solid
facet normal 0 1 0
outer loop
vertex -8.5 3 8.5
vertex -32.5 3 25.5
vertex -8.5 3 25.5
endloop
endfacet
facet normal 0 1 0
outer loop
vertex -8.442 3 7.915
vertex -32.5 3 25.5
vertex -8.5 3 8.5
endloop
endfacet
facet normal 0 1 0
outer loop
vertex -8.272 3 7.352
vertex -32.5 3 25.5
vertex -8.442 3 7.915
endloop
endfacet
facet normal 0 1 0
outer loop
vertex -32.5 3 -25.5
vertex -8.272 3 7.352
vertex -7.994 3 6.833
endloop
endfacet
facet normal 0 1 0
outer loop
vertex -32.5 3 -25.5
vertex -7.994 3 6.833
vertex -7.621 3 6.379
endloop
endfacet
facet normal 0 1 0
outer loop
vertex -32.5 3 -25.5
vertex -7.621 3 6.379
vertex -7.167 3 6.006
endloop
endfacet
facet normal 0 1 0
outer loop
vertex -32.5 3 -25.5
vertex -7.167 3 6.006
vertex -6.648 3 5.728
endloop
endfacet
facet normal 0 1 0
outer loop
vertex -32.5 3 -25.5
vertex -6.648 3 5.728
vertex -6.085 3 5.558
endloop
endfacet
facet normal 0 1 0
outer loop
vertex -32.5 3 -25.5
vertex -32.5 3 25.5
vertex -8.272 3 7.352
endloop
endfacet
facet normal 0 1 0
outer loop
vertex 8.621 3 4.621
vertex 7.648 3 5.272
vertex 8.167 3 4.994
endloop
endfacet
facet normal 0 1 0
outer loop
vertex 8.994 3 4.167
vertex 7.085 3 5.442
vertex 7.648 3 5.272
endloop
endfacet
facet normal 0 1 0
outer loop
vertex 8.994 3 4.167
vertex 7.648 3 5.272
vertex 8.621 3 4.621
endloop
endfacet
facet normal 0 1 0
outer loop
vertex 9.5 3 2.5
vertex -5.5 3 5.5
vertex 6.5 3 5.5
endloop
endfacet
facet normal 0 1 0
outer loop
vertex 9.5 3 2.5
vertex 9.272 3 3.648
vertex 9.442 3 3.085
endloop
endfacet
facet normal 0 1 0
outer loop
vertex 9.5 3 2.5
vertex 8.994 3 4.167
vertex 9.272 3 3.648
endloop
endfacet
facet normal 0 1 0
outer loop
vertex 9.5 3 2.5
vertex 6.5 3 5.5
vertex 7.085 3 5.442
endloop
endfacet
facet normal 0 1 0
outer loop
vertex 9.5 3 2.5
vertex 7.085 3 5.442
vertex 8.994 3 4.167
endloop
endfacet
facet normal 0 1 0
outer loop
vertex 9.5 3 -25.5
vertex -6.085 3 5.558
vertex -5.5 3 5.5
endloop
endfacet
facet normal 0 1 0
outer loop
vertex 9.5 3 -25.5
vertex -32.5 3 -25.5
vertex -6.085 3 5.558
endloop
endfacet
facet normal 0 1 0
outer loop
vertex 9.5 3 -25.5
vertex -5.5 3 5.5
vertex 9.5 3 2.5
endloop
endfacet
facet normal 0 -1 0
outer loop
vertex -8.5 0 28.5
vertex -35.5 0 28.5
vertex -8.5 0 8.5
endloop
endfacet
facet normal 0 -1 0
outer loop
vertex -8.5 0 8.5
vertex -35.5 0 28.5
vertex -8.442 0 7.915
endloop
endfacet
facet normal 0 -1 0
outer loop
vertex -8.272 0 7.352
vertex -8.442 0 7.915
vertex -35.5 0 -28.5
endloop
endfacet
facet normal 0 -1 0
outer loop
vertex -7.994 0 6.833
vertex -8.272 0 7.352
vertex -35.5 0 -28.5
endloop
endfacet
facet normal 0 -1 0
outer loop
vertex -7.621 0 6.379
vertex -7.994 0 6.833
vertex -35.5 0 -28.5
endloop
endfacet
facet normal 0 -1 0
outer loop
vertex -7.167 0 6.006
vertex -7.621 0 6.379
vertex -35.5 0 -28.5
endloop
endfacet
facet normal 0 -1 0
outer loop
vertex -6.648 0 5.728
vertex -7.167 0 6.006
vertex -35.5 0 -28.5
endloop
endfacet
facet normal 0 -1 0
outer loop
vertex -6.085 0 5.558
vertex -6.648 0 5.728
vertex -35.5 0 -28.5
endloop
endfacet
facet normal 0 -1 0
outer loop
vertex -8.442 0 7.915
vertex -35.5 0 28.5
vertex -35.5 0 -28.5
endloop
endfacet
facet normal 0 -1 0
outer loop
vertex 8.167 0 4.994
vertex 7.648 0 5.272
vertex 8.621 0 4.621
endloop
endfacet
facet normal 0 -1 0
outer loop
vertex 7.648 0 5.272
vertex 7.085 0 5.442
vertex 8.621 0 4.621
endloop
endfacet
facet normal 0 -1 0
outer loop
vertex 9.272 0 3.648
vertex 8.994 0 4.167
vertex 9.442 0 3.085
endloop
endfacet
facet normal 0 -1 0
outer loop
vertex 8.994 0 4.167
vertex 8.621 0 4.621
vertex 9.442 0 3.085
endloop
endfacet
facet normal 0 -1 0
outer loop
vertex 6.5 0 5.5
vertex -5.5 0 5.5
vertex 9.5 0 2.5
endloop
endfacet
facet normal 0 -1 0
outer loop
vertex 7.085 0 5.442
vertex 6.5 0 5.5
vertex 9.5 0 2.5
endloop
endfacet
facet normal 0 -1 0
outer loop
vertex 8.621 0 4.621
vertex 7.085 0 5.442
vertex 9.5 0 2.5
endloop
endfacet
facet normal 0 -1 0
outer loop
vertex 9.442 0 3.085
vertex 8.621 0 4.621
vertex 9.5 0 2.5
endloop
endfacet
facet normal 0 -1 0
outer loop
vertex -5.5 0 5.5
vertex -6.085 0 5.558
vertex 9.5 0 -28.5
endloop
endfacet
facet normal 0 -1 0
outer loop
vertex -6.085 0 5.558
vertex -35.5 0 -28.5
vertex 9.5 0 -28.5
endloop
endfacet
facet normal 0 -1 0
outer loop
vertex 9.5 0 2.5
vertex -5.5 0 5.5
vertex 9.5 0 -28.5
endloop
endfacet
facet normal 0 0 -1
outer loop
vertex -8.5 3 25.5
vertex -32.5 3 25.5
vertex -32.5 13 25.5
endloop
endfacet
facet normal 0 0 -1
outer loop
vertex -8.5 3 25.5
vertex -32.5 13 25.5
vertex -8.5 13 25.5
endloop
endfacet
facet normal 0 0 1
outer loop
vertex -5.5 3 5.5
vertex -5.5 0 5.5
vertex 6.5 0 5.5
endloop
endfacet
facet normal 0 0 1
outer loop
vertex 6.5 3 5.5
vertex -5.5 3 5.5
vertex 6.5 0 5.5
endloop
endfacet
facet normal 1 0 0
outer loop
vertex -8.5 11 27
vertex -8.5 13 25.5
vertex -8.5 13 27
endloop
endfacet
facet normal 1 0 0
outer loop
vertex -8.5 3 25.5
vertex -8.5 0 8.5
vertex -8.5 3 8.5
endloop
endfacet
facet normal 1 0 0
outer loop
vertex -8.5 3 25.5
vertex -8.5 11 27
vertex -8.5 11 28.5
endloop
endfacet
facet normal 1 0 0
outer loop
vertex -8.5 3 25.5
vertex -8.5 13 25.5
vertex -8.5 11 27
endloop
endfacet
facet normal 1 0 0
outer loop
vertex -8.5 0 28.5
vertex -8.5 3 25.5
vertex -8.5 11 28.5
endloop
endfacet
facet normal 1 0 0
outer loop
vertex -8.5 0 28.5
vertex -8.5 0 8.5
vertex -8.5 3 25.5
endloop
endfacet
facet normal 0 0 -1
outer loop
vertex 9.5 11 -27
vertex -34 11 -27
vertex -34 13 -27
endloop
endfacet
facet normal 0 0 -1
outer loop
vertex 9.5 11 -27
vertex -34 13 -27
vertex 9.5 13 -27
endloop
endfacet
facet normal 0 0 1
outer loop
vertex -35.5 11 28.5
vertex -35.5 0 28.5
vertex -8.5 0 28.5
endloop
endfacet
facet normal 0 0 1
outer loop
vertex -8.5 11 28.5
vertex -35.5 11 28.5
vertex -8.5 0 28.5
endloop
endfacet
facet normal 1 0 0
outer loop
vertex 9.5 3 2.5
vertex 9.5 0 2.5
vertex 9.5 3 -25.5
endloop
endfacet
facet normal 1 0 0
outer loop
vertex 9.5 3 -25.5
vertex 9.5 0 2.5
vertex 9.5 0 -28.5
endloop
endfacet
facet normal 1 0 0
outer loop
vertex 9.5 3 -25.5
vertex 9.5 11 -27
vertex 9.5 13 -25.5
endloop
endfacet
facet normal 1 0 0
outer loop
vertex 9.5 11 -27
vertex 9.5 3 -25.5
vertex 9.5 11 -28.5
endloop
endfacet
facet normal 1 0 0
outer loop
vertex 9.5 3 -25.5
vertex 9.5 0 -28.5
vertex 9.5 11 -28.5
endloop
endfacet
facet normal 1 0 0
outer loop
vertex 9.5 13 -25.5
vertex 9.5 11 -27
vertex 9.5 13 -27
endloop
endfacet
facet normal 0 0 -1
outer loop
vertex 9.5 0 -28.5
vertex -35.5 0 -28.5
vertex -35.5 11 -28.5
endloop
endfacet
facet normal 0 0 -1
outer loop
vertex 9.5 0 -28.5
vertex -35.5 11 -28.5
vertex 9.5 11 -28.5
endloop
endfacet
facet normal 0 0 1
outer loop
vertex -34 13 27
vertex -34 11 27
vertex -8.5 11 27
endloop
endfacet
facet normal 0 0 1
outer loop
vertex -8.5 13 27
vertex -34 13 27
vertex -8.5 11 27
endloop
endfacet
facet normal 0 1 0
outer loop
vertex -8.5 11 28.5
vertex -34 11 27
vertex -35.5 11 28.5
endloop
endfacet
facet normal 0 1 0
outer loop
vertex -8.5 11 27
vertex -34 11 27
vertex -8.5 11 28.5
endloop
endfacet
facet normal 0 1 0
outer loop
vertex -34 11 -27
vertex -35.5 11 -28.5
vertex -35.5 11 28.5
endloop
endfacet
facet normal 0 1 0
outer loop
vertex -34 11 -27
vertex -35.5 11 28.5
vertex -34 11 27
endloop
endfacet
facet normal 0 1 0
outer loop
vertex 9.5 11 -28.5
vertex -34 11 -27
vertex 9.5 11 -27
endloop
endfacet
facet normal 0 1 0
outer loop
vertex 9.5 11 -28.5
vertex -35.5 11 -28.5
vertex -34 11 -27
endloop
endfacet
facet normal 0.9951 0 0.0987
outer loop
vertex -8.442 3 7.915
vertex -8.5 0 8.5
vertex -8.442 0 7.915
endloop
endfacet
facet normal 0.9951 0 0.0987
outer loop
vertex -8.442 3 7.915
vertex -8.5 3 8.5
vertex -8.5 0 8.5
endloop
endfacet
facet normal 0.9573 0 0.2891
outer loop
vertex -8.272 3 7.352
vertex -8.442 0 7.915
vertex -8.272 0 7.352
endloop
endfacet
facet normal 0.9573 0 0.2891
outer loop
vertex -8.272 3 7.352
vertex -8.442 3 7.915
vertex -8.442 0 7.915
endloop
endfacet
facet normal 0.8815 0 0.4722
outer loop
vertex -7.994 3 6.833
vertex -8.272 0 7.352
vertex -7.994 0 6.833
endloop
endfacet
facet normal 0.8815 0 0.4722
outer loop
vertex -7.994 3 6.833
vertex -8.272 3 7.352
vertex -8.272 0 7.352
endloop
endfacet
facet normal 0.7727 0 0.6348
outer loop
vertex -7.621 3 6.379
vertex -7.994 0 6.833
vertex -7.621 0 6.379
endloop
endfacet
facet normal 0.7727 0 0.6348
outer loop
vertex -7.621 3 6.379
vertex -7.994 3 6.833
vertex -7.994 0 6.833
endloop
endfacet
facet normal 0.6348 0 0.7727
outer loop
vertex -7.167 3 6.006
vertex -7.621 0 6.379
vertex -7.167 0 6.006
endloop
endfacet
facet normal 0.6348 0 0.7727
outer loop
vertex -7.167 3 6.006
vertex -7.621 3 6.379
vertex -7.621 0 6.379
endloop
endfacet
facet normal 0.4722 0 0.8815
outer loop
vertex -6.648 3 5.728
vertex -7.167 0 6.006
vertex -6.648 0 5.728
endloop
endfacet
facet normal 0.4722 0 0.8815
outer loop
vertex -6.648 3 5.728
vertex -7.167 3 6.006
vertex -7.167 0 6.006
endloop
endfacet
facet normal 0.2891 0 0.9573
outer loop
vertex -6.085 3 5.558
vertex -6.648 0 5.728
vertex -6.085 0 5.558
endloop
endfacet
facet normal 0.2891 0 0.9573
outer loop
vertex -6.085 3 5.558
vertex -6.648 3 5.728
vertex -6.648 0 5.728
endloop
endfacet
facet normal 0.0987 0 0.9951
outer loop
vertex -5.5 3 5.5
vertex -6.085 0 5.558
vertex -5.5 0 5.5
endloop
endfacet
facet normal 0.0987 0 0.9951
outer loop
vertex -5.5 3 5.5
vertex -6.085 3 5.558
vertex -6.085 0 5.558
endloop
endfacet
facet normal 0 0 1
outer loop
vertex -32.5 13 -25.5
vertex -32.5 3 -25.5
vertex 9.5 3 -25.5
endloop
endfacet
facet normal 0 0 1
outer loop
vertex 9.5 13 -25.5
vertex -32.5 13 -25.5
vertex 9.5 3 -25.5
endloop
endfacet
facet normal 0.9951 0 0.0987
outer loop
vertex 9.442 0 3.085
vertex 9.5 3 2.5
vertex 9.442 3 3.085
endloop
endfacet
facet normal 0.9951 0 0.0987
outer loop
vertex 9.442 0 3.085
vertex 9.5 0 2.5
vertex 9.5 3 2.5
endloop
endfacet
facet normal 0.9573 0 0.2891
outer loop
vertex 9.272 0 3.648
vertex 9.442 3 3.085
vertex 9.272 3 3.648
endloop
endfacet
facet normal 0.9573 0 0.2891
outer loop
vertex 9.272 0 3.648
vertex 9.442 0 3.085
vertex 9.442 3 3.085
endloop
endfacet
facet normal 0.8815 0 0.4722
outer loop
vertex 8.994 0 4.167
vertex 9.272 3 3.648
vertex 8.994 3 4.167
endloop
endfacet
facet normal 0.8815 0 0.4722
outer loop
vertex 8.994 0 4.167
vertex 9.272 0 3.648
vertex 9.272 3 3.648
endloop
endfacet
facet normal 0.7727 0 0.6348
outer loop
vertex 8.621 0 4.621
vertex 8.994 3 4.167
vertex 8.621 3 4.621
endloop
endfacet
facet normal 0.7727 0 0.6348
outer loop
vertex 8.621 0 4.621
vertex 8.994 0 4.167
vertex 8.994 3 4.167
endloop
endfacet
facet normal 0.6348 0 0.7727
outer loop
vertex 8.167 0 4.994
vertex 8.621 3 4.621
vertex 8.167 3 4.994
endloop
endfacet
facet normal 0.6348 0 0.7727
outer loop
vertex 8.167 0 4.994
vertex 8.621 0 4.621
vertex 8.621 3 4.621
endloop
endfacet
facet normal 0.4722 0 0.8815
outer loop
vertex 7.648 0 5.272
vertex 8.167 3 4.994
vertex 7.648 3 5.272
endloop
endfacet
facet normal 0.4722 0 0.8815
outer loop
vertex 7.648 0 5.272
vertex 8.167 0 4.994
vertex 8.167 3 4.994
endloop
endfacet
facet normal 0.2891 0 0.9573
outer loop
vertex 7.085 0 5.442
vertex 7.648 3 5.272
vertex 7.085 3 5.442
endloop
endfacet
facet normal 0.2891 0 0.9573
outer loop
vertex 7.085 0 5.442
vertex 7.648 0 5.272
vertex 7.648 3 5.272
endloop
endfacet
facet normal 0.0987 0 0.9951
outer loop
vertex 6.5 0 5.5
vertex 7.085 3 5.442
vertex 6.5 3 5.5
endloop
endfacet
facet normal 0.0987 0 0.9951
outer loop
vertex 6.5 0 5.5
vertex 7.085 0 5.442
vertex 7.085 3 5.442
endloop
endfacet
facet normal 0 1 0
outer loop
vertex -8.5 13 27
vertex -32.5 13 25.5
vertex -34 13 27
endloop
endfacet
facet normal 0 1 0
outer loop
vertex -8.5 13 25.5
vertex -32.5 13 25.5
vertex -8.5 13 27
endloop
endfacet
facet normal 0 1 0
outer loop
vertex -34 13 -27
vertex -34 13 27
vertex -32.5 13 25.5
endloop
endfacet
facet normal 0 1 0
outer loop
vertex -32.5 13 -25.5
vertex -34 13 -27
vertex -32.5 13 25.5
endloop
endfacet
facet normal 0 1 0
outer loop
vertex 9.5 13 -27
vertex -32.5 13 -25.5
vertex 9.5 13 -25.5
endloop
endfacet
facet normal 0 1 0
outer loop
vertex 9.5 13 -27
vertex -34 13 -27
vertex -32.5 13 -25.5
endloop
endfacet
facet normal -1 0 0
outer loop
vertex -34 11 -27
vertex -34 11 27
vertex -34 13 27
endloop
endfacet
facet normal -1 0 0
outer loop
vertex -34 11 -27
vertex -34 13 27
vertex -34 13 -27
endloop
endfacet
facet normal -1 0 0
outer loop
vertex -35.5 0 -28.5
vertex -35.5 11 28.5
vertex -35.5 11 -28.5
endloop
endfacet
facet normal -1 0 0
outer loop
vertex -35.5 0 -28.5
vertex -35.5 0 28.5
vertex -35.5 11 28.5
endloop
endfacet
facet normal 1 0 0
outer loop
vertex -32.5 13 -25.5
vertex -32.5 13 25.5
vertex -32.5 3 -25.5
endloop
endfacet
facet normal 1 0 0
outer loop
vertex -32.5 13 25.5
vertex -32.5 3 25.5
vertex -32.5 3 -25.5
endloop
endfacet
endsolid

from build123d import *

# Parameters (mm, degrees)
SKETCH1_W           = 71
SKETCH1_H           = 57
BOSS_EXTRUDE1_DEPTH = 3
SKETCH2_W           = 71
SKETCH2_H           = 57
SKETCH2_W_2         = 65
SKETCH2_H_2         = 51
BOSS_EXTRUDE2_DEPTH = 8
SKETCH6_W           = 68
SKETCH6_H           = 54
SKETCH6_W_2         = 65
SKETCH6_H_2         = 51
BOSS_EXTRUDE5_DEPTH = 2
SKETCH7_W           = 26
SKETCH7_H           = 15.829787861
CUT_EXTRUDE2_DEPTH  = 58
SKETCH8_W           = 44
SKETCH8_H           = 23
CUT_EXTRUDE3_DEPTH  = 14
FILLET1_R           = 3


with BuildPart() as part:
    # Sketch1 → Boss-Extrude1 (new body)
    with BuildSketch(Plane(origin=(0, 0, 0), x_dir=(1, 0, 0), z_dir=(0, 1, 0))):
        Rectangle(SKETCH1_W, SKETCH1_H)
    extrude(amount=BOSS_EXTRUDE1_DEPTH)

    # Sketch2 → Boss-Extrude2 (add)
    with BuildSketch(Plane(origin=(0, 3, 0), x_dir=(1, 0, 0), z_dir=(0, 1, 0))):
        Rectangle(SKETCH2_W, SKETCH2_H)
        Rectangle(SKETCH2_W_2, SKETCH2_H_2, mode=Mode.SUBTRACT)
    extrude(amount=BOSS_EXTRUDE2_DEPTH)

    # Sketch6 → Boss-Extrude5 (add)
    with BuildSketch(Plane(origin=(0, 11, 0), x_dir=(1, 0, 0), z_dir=(0, 1, 0))):
        Rectangle(SKETCH6_W, SKETCH6_H)
        Rectangle(SKETCH6_W_2, SKETCH6_H_2, mode=Mode.SUBTRACT)
    extrude(amount=BOSS_EXTRUDE5_DEPTH)

    # Sketch7 → Cut-Extrude2 (cut, through all)
    with BuildSketch(Plane(origin=(0, 0, -28.5), x_dir=(-1, 0, 0), z_dir=(0, 0, -1))):
        with Locations((-22.5, 7.063052876)):
            Rectangle(SKETCH7_W, SKETCH7_H)
    extrude(amount=-CUT_EXTRUDE2_DEPTH, mode=Mode.SUBTRACT)

    # Sketch8 → Cut-Extrude3 (cut, through all)
    with BuildSketch(Plane.XZ):
        with Locations((13.5, 17)):
            Rectangle(SKETCH8_W, SKETCH8_H)
    extrude(amount=-CUT_EXTRUDE3_DEPTH, mode=Mode.SUBTRACT)

    # Fillet1
    fillet1_edges = [part.edges().sort_by_distance(p)[0] for p in [
        (-8.5, 1.5, 5.5),
        (9.5, 1.5, 5.5),
    ]]
    fillet(fillet1_edges, radius=FILLET1_R)


solid = part.part
